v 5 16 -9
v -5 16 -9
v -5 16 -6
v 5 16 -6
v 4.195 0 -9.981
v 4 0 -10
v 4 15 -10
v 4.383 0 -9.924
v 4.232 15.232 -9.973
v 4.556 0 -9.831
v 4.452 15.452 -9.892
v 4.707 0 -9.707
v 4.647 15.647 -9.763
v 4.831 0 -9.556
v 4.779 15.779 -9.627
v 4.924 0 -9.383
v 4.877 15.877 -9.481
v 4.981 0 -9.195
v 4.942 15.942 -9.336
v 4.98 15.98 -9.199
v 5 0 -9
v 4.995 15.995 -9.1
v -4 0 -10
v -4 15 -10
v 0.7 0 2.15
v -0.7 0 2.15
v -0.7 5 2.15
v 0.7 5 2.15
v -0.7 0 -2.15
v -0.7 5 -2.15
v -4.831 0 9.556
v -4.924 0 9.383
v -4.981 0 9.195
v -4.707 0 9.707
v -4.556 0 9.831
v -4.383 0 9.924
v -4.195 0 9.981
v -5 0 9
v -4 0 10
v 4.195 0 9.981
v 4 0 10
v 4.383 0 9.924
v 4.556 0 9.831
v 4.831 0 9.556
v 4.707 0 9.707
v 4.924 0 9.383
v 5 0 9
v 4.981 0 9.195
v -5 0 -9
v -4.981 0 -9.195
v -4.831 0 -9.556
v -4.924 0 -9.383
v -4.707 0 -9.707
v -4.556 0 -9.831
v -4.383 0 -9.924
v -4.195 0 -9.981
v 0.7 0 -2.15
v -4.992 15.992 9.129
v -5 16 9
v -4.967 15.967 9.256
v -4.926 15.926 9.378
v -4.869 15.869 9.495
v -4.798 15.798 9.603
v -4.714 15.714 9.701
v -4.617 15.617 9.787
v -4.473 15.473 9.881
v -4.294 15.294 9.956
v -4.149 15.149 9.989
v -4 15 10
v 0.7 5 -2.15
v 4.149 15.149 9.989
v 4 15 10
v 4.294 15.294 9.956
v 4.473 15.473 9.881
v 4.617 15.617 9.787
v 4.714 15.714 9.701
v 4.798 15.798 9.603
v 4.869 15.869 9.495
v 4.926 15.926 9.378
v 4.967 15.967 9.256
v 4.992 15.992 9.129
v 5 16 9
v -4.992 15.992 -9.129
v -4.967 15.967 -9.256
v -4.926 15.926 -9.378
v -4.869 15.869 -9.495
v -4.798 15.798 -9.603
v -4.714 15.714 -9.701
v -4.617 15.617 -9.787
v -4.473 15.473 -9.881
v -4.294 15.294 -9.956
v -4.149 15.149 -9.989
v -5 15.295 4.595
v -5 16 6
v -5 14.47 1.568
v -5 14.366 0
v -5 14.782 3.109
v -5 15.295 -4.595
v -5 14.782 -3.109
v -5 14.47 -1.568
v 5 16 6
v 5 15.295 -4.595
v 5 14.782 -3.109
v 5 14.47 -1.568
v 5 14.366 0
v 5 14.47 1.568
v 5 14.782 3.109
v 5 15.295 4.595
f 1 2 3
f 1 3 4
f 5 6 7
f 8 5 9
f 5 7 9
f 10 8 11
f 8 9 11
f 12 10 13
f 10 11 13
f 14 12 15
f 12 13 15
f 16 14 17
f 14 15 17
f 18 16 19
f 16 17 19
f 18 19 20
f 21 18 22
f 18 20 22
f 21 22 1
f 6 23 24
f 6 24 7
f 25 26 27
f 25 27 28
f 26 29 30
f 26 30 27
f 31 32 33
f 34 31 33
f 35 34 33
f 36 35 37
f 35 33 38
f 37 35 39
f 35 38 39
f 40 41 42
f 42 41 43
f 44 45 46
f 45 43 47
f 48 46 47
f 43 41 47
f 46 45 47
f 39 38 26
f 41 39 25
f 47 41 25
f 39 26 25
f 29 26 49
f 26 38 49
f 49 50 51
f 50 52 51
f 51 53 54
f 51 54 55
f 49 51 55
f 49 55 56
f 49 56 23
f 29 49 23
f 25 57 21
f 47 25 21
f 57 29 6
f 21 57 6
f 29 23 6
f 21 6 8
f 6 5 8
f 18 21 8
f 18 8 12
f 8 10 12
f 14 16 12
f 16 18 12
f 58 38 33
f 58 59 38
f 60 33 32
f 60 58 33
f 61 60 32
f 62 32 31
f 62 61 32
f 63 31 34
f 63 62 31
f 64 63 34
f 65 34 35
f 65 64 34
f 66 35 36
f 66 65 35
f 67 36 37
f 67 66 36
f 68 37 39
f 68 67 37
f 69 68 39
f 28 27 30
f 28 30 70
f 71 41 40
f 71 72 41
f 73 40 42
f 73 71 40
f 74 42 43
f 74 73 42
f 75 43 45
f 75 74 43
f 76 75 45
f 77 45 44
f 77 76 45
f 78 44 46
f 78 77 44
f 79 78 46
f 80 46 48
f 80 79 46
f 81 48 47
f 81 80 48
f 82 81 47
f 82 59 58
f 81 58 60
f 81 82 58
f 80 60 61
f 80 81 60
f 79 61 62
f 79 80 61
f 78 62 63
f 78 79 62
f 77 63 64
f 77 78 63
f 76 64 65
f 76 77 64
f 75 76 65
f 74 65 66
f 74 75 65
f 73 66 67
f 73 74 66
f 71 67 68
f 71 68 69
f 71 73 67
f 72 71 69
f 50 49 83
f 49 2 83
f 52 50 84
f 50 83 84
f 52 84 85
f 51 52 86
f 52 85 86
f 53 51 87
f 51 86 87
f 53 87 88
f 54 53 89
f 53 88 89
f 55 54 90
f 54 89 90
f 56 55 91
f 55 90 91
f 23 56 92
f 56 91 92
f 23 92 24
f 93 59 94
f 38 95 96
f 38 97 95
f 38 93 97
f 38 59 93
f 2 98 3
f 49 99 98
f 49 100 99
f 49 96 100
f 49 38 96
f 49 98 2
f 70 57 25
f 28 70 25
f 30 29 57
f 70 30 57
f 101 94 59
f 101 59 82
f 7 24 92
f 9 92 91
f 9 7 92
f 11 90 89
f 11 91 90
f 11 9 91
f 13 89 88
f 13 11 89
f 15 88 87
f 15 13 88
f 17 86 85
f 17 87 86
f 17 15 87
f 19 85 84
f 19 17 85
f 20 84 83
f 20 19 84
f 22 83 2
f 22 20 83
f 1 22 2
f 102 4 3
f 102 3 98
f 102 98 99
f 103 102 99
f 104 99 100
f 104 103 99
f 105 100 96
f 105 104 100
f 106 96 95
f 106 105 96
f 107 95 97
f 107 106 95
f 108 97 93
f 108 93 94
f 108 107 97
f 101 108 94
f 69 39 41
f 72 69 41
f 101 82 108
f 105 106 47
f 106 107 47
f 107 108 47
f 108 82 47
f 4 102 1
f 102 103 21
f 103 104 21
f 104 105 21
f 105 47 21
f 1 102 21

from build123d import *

# Parameters (mm, degrees)
SKETCH1_W           = 10
SKETCH1_H           = 20
BOSS_EXTRUDE1_DEPTH = 16
SKETCH2_W           = 1.4
SKETCH2_H           = 4.3
CUT_EXTRUDE1_DEPTH  = 5
CUT_EXTRUDE2_DEPTH  = 10
FILLET2_R           = 1


with BuildPart() as part:
    # Sketch1 → Boss-Extrude1 (new body)
    with BuildSketch(Plane(origin=(0, 0, 0), x_dir=(1, 0, 0), z_dir=(0, 1, 0))):
        Rectangle(SKETCH1_W, SKETCH1_H)
    extrude(amount=BOSS_EXTRUDE1_DEPTH)

    # Sketch2 → Cut-Extrude1 (cut)
    with BuildSketch(Plane.XZ):
        Rectangle(SKETCH2_W, SKETCH2_H)
    extrude(amount=-CUT_EXTRUDE1_DEPTH, mode=Mode.SUBTRACT)

    # Sketch6 → Cut-Extrude2 (cut)
    with BuildSketch(Plane(origin=(5, 0, 0), x_dir=(0, 0, -1), z_dir=(1, 0, 0))):
        with BuildLine():
            Line((-6, 16), (6, 16))
            ThreePointArc((6, 16), (0, 14.36598161), (-6, 16))
        make_face()
    extrude(amount=-CUT_EXTRUDE2_DEPTH, mode=Mode.SUBTRACT)

    # Fillet2
    fillet2_edges = [part.edges().sort_by_distance(p)[0] for p in [
        (0, 16, 10),
        (5, 8, 10),
        (-5, 8, 10),
        (-5, 8, -10),
        (5, 8, -10),
        (0, 16, -10),
    ]]
    fillet(fillet2_edges, radius=FILLET2_R)


solid = part.part
